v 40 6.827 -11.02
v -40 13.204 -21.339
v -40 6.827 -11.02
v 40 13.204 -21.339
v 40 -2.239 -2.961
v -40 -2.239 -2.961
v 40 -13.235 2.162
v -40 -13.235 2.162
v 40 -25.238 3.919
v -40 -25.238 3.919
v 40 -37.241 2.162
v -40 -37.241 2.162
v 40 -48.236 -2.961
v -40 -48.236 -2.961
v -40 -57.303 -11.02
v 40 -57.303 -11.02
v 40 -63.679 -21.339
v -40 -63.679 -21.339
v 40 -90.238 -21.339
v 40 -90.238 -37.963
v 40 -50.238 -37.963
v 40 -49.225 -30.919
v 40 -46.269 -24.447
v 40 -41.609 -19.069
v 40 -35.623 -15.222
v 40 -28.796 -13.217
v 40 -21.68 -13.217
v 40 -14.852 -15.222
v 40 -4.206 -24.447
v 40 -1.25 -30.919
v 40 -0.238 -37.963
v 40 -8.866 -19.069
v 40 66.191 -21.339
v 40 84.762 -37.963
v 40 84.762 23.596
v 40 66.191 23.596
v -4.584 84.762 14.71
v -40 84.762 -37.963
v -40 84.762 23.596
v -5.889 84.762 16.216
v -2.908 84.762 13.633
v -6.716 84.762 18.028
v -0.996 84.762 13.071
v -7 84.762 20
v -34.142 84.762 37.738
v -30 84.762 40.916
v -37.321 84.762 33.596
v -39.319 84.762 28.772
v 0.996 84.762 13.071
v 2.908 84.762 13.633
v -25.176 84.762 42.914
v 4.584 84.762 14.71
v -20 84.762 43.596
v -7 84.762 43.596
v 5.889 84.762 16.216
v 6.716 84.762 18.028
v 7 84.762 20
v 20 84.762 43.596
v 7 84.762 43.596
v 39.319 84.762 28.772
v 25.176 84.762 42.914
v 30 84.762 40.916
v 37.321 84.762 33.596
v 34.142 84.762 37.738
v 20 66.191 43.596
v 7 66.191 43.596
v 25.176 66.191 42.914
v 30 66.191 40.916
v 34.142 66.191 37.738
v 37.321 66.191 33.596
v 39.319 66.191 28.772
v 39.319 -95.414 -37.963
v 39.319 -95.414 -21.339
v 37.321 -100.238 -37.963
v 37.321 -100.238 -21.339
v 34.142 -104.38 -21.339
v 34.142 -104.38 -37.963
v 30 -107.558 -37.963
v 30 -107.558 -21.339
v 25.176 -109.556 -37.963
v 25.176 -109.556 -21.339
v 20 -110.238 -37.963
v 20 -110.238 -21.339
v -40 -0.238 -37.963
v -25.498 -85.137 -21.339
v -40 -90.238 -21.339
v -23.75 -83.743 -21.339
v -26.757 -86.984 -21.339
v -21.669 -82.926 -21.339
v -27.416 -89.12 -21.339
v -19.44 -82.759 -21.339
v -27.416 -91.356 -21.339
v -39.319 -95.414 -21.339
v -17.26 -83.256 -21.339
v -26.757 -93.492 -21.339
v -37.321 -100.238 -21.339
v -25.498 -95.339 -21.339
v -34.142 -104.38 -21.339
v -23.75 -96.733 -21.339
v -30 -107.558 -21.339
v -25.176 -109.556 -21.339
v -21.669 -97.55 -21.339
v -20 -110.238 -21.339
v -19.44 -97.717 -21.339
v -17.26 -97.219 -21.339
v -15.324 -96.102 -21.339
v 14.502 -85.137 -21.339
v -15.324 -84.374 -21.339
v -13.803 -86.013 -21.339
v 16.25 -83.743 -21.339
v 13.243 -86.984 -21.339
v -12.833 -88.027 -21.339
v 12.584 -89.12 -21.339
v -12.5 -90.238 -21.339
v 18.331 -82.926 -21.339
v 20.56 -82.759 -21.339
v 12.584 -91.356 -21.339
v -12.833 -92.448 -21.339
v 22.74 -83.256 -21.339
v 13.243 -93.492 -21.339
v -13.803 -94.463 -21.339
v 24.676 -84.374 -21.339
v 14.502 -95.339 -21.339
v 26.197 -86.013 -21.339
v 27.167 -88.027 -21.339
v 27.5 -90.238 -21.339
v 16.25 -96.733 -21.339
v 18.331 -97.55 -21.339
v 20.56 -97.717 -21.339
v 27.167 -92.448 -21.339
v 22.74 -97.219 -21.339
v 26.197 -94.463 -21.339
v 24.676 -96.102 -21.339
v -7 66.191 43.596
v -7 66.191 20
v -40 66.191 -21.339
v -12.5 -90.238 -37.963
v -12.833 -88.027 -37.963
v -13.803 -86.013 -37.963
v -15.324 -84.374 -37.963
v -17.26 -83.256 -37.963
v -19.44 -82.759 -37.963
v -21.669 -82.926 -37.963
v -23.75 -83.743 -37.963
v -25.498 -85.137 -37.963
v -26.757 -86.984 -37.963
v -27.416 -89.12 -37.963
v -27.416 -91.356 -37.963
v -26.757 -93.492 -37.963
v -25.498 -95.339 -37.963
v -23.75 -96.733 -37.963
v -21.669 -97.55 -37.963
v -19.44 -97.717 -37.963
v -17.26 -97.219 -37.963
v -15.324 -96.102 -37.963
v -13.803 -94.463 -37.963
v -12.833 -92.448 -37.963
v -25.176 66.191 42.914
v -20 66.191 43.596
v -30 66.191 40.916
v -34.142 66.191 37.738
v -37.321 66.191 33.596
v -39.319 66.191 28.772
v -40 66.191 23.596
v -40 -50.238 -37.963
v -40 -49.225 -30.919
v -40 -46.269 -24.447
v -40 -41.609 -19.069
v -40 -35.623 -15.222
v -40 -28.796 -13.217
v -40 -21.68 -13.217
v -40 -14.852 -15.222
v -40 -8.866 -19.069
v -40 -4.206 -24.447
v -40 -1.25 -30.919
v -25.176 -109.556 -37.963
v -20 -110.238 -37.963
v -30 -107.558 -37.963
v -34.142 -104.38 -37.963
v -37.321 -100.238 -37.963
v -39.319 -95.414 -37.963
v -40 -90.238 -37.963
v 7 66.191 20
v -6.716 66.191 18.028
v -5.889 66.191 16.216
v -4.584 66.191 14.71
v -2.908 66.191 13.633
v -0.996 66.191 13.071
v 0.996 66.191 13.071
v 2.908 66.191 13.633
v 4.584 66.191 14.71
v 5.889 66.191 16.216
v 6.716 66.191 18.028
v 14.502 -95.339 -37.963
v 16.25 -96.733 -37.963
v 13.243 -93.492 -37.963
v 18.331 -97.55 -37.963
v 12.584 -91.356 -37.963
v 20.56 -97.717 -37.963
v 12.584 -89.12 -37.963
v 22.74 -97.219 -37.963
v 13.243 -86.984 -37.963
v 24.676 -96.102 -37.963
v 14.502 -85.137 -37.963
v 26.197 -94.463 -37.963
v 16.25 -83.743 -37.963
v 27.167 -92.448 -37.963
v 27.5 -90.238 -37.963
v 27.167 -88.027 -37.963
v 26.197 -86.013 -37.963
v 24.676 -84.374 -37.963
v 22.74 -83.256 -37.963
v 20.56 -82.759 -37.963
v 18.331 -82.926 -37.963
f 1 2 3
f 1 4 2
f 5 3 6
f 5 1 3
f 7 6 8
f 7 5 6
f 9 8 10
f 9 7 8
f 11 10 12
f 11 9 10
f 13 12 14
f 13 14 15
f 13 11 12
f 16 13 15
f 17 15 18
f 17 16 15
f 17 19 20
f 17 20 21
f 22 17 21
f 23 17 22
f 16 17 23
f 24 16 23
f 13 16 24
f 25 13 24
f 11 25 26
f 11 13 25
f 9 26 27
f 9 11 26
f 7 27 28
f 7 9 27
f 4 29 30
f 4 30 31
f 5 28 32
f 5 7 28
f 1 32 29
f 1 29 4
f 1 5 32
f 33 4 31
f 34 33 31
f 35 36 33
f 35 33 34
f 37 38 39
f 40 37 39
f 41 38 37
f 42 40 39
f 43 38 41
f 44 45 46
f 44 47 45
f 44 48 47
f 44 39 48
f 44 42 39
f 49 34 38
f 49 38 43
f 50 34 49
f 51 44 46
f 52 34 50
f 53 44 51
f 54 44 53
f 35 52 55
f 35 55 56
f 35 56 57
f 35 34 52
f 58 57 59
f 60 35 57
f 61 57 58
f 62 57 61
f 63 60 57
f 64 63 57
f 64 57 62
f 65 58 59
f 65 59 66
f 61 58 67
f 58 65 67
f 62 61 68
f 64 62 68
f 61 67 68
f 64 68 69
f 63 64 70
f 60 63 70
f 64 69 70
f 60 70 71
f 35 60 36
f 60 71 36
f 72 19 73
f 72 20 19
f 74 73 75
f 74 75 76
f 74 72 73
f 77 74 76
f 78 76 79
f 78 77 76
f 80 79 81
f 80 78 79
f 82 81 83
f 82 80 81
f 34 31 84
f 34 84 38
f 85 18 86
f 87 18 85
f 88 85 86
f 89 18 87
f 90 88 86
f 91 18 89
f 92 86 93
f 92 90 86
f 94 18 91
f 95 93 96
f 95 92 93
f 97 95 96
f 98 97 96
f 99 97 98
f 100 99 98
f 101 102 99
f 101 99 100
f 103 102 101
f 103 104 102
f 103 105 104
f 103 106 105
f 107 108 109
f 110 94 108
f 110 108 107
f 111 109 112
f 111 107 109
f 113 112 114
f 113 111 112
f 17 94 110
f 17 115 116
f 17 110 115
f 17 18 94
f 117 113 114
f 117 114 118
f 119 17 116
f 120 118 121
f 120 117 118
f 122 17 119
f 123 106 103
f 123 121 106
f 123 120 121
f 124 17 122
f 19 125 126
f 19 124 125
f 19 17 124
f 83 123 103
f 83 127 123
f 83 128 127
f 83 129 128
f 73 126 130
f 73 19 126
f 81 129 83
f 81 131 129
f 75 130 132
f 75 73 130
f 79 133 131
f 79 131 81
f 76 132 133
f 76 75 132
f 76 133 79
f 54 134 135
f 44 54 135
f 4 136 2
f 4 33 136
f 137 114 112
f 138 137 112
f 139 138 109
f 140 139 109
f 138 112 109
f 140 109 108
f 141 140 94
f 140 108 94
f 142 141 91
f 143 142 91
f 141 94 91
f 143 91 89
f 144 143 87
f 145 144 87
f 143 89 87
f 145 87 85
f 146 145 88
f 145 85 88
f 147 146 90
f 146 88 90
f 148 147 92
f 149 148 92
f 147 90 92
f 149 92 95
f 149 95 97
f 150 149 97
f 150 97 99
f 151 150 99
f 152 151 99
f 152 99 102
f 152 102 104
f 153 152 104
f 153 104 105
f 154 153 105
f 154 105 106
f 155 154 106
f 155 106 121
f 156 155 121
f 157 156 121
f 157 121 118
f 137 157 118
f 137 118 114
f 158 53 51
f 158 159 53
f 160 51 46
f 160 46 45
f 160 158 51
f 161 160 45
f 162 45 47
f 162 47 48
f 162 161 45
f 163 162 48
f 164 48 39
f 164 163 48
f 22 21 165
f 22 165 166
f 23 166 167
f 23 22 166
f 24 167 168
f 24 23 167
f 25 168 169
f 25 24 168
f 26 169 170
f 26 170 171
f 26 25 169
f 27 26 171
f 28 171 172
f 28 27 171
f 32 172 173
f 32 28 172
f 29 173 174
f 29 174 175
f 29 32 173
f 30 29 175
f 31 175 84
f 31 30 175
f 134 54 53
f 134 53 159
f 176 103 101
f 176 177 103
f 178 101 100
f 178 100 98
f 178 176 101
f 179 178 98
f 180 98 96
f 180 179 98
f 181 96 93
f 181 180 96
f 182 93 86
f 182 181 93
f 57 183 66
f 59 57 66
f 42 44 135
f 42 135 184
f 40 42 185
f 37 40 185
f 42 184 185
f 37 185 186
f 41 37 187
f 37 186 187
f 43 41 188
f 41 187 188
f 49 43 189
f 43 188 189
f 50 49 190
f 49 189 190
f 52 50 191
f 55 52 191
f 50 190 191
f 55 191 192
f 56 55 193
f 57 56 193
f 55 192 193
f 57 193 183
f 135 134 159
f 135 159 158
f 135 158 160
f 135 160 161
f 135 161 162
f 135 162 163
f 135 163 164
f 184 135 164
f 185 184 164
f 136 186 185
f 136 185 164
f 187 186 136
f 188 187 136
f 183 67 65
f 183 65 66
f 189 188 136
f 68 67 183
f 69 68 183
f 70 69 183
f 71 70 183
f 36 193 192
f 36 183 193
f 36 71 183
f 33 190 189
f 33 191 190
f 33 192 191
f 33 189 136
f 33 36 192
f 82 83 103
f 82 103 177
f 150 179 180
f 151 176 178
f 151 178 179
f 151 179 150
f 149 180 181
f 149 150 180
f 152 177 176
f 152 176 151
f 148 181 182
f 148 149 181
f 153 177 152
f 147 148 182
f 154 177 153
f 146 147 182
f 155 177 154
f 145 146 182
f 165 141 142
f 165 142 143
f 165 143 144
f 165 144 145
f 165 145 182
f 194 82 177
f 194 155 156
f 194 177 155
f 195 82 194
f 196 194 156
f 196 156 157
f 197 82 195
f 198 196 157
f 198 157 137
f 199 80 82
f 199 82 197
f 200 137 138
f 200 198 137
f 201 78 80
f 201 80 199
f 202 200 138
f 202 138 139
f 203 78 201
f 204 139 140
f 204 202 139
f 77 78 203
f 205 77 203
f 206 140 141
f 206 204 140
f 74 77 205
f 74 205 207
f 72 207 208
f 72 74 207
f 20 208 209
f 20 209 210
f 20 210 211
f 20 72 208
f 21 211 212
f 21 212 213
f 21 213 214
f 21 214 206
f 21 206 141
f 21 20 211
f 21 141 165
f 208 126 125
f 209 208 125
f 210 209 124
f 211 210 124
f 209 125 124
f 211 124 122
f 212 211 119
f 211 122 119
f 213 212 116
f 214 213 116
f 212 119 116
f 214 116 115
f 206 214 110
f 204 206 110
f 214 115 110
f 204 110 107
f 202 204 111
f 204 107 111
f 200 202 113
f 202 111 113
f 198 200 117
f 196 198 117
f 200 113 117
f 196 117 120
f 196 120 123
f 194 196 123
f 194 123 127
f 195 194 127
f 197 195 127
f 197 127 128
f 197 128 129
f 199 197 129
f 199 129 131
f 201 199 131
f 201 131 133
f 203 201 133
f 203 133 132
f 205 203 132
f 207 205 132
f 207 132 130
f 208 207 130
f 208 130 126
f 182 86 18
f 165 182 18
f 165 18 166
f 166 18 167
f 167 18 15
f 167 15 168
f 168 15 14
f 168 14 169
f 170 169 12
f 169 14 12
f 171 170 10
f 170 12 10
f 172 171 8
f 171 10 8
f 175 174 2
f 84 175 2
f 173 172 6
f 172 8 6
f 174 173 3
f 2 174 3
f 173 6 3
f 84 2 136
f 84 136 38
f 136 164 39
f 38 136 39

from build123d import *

# Parameters (mm, degrees)
F1_DEPTH = 40
F2_R     = 20
F4_DEPTH = 18.572422
F5_R     = 7.5
F6_DEPTH = 16.624377


with BuildPart() as f1:
    # F0 (on Right) → F1 (new body, symmetric)
    with BuildSketch(Plane.YZ):
        with BuildLine():
            Line((-63.67937, -21.339411), (-110.237809, -21.339411))
            Line((-110.237809, -21.339411), (-110.237809, -37.962787))
            Line((-110.237809, -37.962787), (-50.237809, -37.962787))
            ThreePointArc((-50.237809, -37.962787), (-25.237809, -12.962787), (-0.237809, -37.962787))
            Line((-0.237809, -37.962787), (84.762191, -37.962787))
            Line((84.762191, -37.962787), (84.762191, 43.595657))
            Line((84.762191, 43.595657), (66.190769, 43.595657))
            Line((66.190769, 43.595657), (66.190769, -21.339411))
            Line((66.190769, -21.339411), (13.203752, -21.339411))
            ThreePointArc((13.203752, -21.339411), (-25.237809, 3.919073), (-63.67937, -21.339411))
        make_face()
    extrude(amount=F1_DEPTH, both=True)

    # F2
    f2_edges = [f1.edges().sort_by_distance(p)[0] for p in [
        (40, -110.237809, -29.651099),
        (-40, -110.237809, -29.651099),
        (40, 75.47648, 43.595657),
        (-40, 75.47648, 43.595657),
    ]]
    fillet(f2_edges, radius=F2_R)

    # F3 (on face) → F4 (cut, through all)
    with BuildSketch(Plane.XZ.offset(-66.190769)):
        with BuildLine():
            Line((-7, 43.595657), (-7, 20))
            ThreePointArc((-7, 20), (0, 13), (7, 20))
            Line((7, 20), (7, 43.595657))
            Line((7, 43.595657), (-7, 43.595657))
        make_face()
    extrude(amount=-F4_DEPTH, mode=Mode.SUBTRACT)

    # F5 (on face) → F6 (cut, through all)
    with BuildSketch(Plane.XY.offset(-21.339411)):
        with Locations((-20, -90.237809)):
            Circle(F5_R)
        with Locations((20, -90.237809)):
            Circle(F5_R)
    extrude(amount=-F6_DEPTH, mode=Mode.SUBTRACT)


solid = f1.part
